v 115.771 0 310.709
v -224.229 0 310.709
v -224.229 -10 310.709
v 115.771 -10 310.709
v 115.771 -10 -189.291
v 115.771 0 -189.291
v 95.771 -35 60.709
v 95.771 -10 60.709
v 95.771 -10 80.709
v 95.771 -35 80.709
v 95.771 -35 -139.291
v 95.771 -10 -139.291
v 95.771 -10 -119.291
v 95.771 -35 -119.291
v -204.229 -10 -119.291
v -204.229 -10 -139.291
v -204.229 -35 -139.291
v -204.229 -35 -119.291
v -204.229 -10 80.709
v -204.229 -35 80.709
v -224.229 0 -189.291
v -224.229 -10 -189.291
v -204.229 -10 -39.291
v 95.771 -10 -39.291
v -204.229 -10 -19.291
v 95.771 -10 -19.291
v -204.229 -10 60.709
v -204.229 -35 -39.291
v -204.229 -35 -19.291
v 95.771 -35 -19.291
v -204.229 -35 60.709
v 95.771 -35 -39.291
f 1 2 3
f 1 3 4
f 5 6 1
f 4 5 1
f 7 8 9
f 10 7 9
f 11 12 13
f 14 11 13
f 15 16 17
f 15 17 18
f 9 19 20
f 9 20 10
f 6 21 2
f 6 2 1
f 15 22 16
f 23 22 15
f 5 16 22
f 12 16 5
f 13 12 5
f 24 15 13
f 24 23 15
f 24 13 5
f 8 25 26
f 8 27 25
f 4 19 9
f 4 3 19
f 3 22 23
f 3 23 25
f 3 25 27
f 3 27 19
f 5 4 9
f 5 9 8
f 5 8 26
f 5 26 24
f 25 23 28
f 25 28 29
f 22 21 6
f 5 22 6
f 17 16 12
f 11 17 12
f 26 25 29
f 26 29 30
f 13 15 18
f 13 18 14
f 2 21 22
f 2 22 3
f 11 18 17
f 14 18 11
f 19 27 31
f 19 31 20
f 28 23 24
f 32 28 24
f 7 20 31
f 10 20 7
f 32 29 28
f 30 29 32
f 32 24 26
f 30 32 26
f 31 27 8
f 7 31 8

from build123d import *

# Parameters (mm, degrees)
F0_W     = 340
F0_H     = 500
F0_W_2   = 300
F0_H_2   = 20
F1_DEPTH = 10
F2_DEPTH = 35


# Not quite as in the source:
# - a feature names something its author has since deleted; it is built from what else it names


with BuildPart() as f1:
    # F0 (on Front) → F1 (new body)
    with BuildSketch(Plane.XZ):
        with Locations((-54.2285538465, 60.7086803179)):
            Rectangle(F0_W, F0_H)
        with Locations((-54.2285538465, -129.2913196821)):
            Rectangle(F0_W_2, F0_H_2, mode=Mode.SUBTRACT)
        with Locations((-54.2285538465, -29.2913196821)):
            Rectangle(F0_W_2, F0_H_2, mode=Mode.SUBTRACT)
        with Locations((-54.2285538465, 70.7086803179)):
            Rectangle(F0_W_2, F0_H_2, mode=Mode.SUBTRACT)
    extrude(amount=F1_DEPTH)

    # F0 (on Front) → F2 (join)
    with BuildSketch(Plane.XZ):
        with Locations((-54.2285538465, 70.7086803179)):
            Rectangle(F0_W_2, F0_H_2)
        with Locations((-54.2285538465, -29.2913196821)):
            Rectangle(F0_W_2, F0_H_2)
        with Locations((-54.2285538465, -129.2913196821)):
            Rectangle(F0_W_2, F0_H_2)
    extrude(amount=F2_DEPTH)


solid = f1.part
